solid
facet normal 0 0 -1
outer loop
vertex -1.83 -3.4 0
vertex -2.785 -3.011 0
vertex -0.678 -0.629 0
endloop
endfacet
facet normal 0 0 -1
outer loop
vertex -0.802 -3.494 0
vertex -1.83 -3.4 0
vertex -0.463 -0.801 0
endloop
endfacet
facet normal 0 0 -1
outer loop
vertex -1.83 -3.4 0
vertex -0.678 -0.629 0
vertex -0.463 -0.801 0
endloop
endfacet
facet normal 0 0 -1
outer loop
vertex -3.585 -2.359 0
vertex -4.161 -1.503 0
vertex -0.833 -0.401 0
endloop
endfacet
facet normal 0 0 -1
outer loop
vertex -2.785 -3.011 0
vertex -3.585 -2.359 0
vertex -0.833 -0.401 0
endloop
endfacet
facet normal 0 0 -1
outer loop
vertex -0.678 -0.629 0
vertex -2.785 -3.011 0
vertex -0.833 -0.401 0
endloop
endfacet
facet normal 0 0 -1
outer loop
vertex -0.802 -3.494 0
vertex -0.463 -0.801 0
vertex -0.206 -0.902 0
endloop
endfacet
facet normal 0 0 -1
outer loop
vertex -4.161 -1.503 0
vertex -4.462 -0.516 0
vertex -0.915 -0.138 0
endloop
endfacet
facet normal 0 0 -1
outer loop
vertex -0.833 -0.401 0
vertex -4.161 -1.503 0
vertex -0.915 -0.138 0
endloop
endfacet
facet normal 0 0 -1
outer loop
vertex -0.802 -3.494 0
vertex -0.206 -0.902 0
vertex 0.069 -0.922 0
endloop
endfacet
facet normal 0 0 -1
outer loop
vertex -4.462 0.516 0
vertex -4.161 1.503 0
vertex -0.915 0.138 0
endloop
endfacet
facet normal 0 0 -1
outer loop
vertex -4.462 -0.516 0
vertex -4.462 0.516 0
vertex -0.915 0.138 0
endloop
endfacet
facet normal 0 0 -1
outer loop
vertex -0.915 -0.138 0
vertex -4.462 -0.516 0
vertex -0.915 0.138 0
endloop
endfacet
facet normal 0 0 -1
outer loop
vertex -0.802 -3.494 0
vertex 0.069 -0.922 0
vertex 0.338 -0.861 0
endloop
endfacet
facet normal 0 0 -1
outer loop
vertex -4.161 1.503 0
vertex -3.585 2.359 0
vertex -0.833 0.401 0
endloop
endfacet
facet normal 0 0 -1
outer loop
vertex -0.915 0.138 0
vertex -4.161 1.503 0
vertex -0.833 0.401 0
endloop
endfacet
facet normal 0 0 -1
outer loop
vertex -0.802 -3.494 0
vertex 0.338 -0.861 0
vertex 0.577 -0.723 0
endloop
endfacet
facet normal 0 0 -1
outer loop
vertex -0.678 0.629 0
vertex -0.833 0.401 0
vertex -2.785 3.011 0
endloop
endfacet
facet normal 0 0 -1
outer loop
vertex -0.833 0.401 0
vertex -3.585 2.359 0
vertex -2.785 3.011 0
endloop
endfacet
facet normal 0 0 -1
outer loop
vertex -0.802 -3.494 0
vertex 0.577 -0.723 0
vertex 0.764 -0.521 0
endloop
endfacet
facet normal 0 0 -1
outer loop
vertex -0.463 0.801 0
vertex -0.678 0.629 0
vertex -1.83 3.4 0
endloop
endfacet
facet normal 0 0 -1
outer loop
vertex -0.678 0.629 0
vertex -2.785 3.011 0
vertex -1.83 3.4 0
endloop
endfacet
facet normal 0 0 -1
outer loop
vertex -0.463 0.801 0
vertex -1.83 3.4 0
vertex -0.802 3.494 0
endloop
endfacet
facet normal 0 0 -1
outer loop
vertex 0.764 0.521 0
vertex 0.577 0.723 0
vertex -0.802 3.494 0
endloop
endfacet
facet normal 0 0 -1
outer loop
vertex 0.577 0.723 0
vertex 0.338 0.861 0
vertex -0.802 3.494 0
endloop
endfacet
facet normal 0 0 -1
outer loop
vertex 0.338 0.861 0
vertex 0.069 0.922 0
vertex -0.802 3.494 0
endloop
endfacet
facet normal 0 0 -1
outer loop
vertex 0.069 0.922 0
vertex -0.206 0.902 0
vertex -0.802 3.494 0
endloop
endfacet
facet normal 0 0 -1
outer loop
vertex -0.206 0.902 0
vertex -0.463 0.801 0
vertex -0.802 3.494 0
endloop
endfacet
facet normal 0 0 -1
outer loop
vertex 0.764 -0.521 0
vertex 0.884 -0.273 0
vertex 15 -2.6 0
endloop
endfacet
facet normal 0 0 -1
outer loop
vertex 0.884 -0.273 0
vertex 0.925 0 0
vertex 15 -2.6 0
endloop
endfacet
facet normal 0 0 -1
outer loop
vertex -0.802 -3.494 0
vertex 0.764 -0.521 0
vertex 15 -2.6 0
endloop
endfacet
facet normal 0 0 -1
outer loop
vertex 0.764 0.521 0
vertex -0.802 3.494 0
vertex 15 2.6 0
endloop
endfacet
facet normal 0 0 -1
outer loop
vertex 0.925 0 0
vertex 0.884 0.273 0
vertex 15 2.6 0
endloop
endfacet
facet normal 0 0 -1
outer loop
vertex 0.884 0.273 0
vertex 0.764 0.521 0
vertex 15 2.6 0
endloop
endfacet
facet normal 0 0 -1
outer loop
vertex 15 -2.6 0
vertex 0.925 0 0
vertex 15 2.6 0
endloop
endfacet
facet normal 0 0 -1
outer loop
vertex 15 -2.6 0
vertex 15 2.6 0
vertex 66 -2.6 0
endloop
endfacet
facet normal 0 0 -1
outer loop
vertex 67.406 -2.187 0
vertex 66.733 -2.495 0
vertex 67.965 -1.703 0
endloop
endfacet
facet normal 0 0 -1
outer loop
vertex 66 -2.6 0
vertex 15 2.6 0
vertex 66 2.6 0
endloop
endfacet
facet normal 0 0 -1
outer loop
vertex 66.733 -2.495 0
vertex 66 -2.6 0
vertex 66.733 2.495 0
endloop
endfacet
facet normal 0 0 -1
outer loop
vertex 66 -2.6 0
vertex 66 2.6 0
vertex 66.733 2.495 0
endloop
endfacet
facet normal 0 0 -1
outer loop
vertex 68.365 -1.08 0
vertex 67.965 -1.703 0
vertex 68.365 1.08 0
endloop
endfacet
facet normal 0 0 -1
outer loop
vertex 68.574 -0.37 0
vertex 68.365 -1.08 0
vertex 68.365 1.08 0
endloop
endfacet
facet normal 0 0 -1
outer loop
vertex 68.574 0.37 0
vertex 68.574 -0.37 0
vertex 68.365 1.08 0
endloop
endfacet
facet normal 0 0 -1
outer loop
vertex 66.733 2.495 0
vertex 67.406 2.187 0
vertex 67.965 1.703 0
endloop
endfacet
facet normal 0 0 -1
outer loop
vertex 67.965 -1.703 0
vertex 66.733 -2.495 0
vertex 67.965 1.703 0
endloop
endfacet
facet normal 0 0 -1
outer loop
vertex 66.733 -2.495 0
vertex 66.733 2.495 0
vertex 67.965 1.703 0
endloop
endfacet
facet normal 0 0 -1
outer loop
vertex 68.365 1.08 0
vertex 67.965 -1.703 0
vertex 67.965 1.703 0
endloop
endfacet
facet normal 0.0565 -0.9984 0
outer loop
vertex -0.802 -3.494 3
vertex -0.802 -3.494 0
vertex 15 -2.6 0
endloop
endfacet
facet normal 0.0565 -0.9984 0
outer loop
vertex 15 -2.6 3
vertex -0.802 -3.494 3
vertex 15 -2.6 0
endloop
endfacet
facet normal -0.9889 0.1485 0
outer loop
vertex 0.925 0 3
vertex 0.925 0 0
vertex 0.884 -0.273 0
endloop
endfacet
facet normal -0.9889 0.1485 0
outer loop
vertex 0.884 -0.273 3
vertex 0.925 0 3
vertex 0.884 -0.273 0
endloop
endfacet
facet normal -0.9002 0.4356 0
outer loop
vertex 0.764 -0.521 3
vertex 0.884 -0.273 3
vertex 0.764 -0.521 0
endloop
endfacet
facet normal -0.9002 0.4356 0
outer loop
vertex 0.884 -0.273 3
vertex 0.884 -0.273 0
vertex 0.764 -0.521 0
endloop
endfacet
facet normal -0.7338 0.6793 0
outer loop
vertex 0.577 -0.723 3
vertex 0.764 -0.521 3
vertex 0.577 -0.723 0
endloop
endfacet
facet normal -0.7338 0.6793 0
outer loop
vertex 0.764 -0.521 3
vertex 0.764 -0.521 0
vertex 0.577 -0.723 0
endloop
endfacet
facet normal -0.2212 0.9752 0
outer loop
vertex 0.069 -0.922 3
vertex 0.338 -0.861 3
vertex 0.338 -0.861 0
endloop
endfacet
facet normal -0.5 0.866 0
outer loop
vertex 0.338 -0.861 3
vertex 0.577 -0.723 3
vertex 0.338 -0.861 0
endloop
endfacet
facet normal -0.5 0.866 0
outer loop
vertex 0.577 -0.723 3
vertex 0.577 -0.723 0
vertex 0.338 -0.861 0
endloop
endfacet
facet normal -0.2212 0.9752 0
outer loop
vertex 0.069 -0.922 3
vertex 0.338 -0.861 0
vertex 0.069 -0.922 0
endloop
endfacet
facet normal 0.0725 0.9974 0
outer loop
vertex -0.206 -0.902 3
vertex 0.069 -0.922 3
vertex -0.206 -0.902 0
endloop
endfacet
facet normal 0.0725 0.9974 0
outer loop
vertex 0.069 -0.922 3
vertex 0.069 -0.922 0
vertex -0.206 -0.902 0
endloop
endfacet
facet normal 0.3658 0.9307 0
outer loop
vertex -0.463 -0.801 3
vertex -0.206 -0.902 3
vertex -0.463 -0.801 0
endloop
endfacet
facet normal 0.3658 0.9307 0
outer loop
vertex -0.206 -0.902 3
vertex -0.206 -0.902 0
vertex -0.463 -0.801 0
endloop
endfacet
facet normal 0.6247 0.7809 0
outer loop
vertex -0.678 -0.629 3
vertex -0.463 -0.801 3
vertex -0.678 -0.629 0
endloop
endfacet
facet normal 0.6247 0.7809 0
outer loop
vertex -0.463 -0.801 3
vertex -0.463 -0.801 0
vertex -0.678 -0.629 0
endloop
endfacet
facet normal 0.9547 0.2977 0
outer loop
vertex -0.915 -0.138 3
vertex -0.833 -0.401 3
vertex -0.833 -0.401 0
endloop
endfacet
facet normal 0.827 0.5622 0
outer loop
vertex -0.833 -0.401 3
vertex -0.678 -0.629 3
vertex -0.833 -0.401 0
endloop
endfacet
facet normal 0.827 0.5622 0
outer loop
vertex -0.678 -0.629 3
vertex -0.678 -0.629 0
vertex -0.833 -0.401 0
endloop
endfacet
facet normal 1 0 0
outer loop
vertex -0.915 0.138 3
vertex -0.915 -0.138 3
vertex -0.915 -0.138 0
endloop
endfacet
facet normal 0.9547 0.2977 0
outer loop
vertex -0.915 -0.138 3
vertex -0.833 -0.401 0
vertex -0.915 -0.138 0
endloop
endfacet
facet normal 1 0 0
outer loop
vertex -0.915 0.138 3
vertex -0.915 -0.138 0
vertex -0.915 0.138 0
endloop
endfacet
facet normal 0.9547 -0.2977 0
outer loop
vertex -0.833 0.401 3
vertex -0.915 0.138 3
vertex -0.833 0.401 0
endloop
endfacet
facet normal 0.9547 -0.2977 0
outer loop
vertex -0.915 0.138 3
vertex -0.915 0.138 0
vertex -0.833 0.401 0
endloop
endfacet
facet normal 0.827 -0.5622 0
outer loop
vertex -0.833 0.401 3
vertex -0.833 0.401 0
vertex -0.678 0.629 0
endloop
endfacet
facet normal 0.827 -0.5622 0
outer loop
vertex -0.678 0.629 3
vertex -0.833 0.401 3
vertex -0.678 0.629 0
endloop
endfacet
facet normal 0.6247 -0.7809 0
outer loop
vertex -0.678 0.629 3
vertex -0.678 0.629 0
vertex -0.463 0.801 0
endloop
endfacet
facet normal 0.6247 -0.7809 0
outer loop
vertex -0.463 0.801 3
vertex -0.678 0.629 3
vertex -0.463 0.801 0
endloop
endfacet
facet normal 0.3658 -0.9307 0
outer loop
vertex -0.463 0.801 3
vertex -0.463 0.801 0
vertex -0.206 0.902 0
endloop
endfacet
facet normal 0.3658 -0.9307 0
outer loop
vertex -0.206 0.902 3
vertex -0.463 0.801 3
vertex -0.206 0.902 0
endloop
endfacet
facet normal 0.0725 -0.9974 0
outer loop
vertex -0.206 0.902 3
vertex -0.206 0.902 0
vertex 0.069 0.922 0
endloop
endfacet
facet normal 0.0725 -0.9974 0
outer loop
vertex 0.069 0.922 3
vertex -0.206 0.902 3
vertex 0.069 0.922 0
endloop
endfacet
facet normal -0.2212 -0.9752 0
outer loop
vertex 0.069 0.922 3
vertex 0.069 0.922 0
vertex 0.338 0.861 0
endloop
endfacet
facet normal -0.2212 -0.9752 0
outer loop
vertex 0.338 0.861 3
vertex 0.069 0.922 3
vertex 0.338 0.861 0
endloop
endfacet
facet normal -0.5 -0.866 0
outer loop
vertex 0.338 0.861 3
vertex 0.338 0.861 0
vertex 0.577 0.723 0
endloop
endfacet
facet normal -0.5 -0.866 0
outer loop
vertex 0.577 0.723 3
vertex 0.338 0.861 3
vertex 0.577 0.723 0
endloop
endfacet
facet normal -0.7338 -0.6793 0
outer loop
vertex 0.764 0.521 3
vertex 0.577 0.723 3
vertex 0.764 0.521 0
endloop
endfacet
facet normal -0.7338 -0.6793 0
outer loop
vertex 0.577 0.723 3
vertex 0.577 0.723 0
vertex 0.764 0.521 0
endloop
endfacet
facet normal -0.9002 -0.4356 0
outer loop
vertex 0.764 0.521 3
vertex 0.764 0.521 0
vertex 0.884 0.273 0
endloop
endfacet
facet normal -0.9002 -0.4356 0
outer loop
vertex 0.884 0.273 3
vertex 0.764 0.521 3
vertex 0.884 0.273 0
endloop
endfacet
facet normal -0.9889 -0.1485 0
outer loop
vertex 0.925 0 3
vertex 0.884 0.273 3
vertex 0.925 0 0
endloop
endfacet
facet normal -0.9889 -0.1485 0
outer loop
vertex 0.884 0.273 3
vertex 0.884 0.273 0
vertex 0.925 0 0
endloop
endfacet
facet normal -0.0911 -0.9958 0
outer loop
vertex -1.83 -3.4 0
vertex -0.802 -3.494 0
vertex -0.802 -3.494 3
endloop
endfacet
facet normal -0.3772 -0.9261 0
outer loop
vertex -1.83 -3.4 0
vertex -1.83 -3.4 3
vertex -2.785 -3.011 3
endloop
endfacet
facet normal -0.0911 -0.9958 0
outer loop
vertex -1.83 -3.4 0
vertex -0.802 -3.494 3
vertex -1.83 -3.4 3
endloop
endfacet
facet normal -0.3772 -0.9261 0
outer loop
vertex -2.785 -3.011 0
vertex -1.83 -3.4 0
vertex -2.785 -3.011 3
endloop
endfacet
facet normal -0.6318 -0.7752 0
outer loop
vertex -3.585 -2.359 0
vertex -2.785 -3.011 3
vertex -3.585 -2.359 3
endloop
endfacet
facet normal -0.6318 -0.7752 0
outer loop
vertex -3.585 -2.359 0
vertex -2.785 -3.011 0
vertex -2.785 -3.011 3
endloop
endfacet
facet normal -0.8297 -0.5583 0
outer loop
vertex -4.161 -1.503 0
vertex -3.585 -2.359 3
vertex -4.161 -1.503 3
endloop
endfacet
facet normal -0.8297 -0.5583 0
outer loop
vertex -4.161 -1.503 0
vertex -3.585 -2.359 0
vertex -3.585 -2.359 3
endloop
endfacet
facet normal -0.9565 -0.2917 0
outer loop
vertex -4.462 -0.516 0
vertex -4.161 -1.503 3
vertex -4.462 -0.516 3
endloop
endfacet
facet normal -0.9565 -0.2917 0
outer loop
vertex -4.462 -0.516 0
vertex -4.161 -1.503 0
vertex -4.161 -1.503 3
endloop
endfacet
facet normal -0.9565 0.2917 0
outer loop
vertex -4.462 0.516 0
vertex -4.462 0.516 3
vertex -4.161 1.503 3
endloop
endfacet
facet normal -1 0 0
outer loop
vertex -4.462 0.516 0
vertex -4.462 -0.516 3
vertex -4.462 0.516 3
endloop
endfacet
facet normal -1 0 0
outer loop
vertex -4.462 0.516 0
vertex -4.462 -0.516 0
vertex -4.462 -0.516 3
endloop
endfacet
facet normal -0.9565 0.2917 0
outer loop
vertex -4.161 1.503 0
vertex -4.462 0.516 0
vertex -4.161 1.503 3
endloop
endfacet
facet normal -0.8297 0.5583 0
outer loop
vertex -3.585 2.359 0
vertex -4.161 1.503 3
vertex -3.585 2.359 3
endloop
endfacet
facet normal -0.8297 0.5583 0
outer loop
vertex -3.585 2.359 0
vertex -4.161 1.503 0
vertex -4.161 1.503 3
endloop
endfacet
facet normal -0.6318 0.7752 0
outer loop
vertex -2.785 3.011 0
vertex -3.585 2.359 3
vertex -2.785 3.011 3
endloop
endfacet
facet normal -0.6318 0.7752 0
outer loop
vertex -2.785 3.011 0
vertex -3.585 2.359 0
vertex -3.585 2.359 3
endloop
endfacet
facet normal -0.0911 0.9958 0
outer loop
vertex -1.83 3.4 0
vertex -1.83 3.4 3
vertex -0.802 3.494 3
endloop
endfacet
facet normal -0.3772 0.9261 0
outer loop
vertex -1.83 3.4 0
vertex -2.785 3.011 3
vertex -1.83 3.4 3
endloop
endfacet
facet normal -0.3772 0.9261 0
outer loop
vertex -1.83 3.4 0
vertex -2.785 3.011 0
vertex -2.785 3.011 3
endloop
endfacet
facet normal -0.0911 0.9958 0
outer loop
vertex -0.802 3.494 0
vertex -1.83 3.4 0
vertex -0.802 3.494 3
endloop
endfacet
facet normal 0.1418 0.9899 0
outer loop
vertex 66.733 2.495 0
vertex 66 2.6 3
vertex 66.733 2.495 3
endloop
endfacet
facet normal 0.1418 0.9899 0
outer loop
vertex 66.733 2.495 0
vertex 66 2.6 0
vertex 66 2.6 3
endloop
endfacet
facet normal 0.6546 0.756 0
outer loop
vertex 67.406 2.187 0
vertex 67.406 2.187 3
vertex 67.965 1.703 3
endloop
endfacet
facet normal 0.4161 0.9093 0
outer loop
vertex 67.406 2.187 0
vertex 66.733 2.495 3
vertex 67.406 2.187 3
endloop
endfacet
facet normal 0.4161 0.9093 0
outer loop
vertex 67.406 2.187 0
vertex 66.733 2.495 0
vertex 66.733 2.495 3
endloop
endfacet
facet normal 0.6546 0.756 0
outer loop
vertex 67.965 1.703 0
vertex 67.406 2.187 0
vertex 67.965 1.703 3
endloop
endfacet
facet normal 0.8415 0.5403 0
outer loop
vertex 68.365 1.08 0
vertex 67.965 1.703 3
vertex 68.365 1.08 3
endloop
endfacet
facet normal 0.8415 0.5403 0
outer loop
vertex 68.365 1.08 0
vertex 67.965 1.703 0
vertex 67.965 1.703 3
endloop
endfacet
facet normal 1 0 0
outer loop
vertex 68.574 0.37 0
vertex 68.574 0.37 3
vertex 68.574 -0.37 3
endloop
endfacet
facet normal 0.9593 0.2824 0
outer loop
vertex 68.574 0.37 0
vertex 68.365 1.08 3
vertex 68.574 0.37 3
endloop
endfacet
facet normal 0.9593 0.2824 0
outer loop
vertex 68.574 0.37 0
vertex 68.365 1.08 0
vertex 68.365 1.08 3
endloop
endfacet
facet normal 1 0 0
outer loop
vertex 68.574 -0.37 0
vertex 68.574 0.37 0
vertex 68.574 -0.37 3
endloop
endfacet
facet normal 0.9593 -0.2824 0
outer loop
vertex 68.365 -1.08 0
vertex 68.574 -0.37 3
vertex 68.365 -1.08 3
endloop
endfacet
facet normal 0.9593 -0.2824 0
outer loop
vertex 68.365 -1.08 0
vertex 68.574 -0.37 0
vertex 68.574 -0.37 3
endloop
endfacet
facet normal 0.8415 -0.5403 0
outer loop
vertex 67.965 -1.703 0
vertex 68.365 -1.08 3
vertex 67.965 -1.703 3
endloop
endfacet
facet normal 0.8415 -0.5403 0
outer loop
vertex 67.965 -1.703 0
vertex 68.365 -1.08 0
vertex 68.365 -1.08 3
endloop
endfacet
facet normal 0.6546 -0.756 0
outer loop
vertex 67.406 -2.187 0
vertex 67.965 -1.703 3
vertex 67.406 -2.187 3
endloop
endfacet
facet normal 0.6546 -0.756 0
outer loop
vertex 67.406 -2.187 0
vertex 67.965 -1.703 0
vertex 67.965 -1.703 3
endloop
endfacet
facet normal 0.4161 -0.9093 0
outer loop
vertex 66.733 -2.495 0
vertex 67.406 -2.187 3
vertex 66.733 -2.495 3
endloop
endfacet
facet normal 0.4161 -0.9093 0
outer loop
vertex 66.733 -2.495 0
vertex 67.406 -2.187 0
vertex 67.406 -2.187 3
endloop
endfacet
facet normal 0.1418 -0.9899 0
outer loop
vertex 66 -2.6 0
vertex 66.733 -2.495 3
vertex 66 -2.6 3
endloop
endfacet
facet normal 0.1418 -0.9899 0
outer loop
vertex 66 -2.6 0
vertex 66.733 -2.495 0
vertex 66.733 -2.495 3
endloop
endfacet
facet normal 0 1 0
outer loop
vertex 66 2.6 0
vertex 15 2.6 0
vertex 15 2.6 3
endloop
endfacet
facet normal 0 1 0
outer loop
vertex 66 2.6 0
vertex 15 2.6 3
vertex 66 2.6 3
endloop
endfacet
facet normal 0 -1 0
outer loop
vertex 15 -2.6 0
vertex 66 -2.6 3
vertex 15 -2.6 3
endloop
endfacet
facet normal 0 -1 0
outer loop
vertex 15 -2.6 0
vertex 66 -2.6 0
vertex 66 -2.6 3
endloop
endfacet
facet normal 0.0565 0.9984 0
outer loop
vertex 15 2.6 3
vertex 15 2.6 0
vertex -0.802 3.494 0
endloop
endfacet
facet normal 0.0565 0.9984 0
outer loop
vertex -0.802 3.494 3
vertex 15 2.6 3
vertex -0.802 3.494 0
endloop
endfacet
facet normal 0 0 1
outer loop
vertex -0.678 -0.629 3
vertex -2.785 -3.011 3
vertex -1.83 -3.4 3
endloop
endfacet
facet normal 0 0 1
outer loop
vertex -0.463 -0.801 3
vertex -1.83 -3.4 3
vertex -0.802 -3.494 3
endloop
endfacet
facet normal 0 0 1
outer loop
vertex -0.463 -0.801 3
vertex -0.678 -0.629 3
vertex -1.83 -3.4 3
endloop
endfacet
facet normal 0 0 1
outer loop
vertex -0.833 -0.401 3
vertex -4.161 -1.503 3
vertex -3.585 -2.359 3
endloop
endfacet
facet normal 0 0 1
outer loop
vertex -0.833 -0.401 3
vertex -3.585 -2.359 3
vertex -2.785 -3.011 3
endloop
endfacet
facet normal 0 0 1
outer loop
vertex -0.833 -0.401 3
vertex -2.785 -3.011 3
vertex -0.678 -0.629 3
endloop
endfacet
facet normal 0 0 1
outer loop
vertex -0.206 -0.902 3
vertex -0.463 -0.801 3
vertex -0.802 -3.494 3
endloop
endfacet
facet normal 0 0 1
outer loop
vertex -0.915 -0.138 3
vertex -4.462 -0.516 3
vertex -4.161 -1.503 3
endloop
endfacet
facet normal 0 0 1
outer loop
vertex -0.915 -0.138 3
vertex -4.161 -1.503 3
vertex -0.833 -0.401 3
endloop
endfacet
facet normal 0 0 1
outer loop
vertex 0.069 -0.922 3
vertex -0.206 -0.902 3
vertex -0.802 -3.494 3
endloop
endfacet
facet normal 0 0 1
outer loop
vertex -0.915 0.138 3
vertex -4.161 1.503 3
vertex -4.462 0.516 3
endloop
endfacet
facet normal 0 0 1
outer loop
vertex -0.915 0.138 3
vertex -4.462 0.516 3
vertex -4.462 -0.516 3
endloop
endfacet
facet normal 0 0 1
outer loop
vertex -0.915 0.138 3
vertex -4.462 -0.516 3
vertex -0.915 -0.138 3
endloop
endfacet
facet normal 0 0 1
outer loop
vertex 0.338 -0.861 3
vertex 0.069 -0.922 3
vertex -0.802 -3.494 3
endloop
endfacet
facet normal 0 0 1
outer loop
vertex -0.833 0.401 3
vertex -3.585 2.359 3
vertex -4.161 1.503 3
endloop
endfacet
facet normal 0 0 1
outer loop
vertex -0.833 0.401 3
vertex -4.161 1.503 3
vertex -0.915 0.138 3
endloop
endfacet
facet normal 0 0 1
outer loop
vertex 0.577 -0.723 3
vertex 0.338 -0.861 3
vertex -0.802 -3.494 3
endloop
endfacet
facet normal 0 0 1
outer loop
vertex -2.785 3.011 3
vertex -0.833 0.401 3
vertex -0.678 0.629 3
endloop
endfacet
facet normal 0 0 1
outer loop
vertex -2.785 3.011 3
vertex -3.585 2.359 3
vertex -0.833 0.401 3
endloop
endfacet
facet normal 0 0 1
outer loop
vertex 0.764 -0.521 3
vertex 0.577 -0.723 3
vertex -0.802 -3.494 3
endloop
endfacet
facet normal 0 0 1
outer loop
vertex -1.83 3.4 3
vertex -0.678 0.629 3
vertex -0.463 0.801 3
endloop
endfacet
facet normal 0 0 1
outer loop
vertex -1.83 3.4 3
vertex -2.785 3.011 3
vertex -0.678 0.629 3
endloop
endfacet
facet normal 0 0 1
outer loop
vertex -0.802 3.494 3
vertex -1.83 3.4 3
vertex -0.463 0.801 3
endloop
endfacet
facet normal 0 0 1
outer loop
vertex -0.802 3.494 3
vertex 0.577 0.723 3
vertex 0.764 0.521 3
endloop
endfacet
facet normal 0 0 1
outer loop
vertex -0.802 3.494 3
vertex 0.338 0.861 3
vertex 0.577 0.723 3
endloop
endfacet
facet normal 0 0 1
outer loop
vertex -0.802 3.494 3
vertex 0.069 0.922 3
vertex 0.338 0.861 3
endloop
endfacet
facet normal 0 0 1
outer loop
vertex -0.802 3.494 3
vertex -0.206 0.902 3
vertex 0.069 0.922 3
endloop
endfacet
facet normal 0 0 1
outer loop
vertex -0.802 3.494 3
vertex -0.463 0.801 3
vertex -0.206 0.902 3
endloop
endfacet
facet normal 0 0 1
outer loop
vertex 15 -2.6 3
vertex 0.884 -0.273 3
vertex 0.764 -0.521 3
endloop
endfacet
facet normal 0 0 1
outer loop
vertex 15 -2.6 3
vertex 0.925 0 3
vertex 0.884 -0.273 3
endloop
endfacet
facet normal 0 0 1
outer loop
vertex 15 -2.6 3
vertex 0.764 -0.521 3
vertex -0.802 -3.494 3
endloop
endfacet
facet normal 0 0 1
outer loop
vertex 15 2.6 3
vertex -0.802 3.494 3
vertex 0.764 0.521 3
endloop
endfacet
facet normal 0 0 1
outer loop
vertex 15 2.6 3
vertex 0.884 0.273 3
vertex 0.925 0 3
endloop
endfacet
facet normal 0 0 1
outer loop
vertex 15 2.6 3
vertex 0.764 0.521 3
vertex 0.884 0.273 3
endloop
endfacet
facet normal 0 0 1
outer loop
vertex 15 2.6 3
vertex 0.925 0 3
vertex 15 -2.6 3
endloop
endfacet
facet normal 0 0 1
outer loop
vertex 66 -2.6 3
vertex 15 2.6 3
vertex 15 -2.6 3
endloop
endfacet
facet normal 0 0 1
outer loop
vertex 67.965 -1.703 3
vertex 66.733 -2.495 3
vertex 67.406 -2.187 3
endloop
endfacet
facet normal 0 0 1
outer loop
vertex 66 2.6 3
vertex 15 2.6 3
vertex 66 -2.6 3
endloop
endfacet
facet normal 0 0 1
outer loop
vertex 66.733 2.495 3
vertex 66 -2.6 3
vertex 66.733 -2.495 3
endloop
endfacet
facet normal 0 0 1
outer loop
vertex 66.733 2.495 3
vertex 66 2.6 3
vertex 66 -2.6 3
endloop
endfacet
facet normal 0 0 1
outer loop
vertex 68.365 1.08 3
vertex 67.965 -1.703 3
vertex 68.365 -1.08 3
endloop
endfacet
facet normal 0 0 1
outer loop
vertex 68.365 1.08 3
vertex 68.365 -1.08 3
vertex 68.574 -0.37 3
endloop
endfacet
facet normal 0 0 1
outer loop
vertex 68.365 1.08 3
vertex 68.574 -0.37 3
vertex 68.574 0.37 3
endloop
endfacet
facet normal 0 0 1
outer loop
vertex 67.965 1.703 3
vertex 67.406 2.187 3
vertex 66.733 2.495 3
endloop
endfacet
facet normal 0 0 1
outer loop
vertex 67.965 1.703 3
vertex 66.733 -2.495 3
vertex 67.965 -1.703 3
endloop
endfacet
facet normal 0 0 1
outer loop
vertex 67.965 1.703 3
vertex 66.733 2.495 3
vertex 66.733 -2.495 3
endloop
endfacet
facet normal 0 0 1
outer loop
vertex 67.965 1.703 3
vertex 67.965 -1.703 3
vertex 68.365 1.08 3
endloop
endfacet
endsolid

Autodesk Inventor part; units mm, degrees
ref_plane "YZ Plane" through (0, 0, 0) normal (1, 0, 0) x (0, 1, 0)
ref_plane "XZ Plane" through (0, 0, 0) normal (0, 1, 0) x (-1, 0, 0)
ref_plane "XY Plane" through (0, 0, 0) normal (0, 0, 1) x (1, 0, 0)
sketch "Sketch1" plane through (0, 0, 0) normal (0, 0, 1) x (1, 0, 0)
  circle A0 centre (0, 0) radius 0.925
  line L0 (15, 2.6) -> (-0.8022, 3.4944)
  arc A1 (-0.8022, 3.4944) -> (-0.8022, -3.4944) centre (-1, 0) ccw
  line L1 (-0.8022, -3.4944) -> (15, -2.6)
  line L2 (0, 0) -> (26, 0) construction
  line L3 (15, 2.6) -> (66, 2.6)
  arc A2 (66, -2.6) -> (66, 2.6) centre (66, 0) ccw
  line L4 (66, -2.6) -> (15, -2.6)
  dimension "d0" = 1.85
  dimension "d7" = 3.5
  dimension "d8" = 1
  dimension "d10" = 2.6
  dimension "d11" = 66
  dimension "d12" = 16
extrude "Extrusion1" add sketch "Sketch1" along normal blind 3
properties part number "slider_link_p6"
